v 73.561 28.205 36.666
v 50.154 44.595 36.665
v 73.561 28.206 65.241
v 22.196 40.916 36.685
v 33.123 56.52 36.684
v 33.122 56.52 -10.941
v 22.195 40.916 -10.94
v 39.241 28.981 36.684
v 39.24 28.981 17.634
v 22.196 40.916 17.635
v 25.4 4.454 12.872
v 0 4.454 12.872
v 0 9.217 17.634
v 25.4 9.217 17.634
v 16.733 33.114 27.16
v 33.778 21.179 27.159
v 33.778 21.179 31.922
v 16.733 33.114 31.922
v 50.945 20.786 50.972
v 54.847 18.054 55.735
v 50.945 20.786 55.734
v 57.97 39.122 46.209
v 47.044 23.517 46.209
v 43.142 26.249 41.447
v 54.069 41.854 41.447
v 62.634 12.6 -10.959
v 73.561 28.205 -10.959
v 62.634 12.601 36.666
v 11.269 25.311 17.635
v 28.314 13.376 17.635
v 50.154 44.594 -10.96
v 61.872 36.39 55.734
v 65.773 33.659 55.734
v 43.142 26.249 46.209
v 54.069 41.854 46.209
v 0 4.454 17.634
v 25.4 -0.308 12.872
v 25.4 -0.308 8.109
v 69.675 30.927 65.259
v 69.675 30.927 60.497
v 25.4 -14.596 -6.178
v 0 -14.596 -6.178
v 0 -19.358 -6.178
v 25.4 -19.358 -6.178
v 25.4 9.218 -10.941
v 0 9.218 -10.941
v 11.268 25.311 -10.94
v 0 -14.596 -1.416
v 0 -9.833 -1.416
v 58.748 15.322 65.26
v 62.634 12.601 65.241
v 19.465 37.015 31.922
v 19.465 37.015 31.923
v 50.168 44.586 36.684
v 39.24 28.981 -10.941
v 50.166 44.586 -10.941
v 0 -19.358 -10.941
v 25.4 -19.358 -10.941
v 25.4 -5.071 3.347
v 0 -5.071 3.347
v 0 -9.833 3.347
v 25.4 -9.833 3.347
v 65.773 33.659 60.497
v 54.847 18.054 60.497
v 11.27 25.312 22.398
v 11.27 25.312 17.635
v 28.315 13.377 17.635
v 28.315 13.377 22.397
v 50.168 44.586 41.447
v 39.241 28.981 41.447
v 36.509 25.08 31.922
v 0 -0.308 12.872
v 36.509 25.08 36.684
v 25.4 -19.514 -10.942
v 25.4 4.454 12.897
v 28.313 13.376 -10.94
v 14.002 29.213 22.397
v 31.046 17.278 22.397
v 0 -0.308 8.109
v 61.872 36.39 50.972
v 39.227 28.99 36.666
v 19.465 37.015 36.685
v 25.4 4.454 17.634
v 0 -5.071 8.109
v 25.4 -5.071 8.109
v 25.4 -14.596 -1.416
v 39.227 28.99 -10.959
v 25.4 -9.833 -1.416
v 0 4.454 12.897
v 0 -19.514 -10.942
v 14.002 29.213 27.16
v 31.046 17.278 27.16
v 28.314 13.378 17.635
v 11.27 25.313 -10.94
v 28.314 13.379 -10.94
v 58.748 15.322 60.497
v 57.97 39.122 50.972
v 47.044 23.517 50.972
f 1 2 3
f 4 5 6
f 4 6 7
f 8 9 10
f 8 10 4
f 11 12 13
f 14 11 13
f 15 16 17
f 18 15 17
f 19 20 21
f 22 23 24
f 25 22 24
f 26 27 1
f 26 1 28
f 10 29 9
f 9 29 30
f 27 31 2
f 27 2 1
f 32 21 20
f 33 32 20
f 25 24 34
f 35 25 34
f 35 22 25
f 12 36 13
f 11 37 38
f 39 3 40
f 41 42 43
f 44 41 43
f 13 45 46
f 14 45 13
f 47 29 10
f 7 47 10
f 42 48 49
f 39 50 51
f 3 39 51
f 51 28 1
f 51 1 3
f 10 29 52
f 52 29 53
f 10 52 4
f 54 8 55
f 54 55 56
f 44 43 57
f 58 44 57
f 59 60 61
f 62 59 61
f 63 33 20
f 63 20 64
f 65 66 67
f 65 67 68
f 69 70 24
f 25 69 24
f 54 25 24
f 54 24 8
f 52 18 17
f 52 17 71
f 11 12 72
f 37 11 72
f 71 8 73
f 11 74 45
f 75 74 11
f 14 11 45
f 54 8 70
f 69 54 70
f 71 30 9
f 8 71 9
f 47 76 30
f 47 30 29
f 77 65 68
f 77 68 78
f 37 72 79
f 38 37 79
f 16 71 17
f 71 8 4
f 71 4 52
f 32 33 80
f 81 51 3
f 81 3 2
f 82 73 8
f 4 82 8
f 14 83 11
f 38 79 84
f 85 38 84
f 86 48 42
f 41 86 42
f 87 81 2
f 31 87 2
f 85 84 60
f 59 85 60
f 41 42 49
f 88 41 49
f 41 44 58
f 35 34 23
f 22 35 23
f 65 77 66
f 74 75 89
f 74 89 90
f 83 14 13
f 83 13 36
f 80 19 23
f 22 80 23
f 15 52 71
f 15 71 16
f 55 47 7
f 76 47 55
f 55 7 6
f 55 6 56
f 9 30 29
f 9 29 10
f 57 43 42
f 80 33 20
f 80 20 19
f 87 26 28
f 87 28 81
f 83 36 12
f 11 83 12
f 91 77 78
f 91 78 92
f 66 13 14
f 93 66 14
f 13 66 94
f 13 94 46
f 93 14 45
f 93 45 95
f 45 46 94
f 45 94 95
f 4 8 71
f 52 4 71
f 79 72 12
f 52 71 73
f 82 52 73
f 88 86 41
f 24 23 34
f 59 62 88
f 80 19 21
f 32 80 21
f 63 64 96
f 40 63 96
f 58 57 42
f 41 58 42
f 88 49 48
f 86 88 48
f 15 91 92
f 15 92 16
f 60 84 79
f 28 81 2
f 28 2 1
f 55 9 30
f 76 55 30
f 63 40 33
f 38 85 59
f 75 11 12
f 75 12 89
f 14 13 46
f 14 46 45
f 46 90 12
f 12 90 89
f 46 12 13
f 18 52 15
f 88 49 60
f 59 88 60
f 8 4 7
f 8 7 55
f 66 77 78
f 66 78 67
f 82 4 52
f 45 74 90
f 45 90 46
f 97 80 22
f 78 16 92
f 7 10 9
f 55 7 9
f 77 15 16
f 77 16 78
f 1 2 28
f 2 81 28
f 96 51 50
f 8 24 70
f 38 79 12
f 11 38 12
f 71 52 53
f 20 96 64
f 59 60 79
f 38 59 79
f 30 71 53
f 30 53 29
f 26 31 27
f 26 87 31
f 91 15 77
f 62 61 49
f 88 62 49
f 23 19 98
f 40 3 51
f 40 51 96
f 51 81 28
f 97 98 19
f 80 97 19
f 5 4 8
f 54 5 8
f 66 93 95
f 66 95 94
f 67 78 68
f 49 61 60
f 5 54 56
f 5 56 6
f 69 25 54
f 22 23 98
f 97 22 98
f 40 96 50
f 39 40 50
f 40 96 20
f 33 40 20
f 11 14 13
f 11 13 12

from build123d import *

# Parameters (mm, degrees)
F1_DEPTH  = 25.4
F3_DEPTH  = 28.575
F5_DEPTH  = 20.80768
F7_DEPTH  = 47.625
F9_DEPTH  = 19.05
F11_DEPTH = 25.4
F13_DEPTH = 20.80768
F15_DEPTH = 19.05
F17_DEPTH = 47.625
F19_DEPTH = 28.575


with BuildPart() as f1:
    # F0 (on Right) → F1 (new body)
    with BuildSketch(Plane.YZ):
        Polygon((4.454064, 17.63429), (4.454064, 12.87179), (9.216739, 17.634465), align=None)
        Polygon((-0.308436, 12.87179), (-0.308436, 8.10929), (4.454064, 12.87179), align=None)
        Polygon((-5.070936, 8.10929), (-5.070936, 3.34679), (-0.308436, 8.10929), align=None)
        Polygon((-9.833436, 3.34679), (-9.833436, -1.41571), (-5.070936, 3.34679), align=None)
        Polygon((-14.595936, -1.41571), (-14.595936, -6.17821), (-9.833436, -1.41571), align=None)
        Polygon((-19.358436, -6.17821), (-19.358436, -10.94071), (-14.595936, -6.17821), align=None)
    extrude(amount=F1_DEPTH)


with BuildPart() as f3:
    # F2 (on face) → F3 (new body)
    with BuildSketch(Plane(origin=(0, -0.000648, 17.634126), x_dir=(1, 0, 0), z_dir=(0, -3.7e-05, 1))):
        Polygon((11.270112, 25.312776), (0, 9.217387), (25.4, 9.217387), (28.313768, 13.378679), align=None)
    extrude(amount=-F3_DEPTH)


with BuildPart() as f5:
    # F4 (on face) → F5 (new body)
    with BuildSketch(Plane(origin=(-4.330755, 3.032428, 0.000111), x_dir=(-0.573576, -0.819152, 1.5e-05), z_dir=(-0.819152, 0.573576, 2.1e-05))):
        Polygon((-36.722638, 27.160346), (-31.960565, 22.397846), (-31.960565, 27.160346), align=None)
        Polygon((-31.960565, 22.397846), (-27.198492, 17.635346), (-27.198492, 22.397846), align=None)
        Polygon((-41.48471, 31.922846), (-36.722638, 27.160346), (-36.722638, 31.922846), align=None)
        Polygon((-46.246783, 36.685346), (-41.48471, 31.922846), (-41.48471, 36.685346), align=None)
    extrude(amount=-F5_DEPTH)


with BuildPart() as f7:
    # F6 (on face) → F7 (new body)
    with BuildSketch(Plane(origin=(0.000944, 0, 36.685346), x_dir=(1, 0, -2.6e-05), z_dir=(2.6e-05, 0, 1))):
        Polygon((33.121941, 56.520421), (22.19531, 40.915575), (39.239963, 28.98078), (50.166595, 44.585626), align=None)
    extrude(amount=-F7_DEPTH)


with BuildPart() as f9:
    # F8 (on face) → F9 (new body)
    with BuildSketch(Plane(origin=(37.452696, 53.487994, -0.000963), x_dir=(-0.819152, 0.573576, -1e-05), z_dir=(0.573576, 0.819152, -1.5e-05))):
        Polygon((-44.080067, 65.241176), (-39.335952, 60.497359), (-39.335952, 65.259859), align=None)
        Polygon((-39.335952, 60.497359), (-34.573153, 55.734859), (-34.573153, 60.497359), align=None)
        Polygon((-34.573153, 55.734859), (-29.810353, 50.972359), (-29.810353, 55.734859), align=None)
        Polygon((-29.810353, 50.972359), (-25.047554, 46.209859), (-25.047554, 50.972359), align=None)
        Polygon((-25.047554, 46.209859), (-20.284755, 41.447359), (-20.284755, 46.209859), align=None)
        Polygon((-20.284755, 41.447359), (-15.521956, 36.684859), (-15.522106, 41.447359), align=None)
    extrude(amount=-F9_DEPTH)


with BuildPart() as f11:
    # F10 (on face) → F11 (new body)
    with BuildSketch(Plane.YZ.offset(25.4)):
        Polygon((9.217789, -10.940535), (9.216739, 17.634465), (4.454064, 12.87179), (4.454064, 12.89745), (-19.514113, -10.941591), align=None)
    extrude(amount=-F11_DEPTH)


with BuildPart() as f13:
    # F12 (on face) → F13 (new body)
    with BuildSketch(Plane(origin=(12.713898, -8.902367, -0.000327), x_dir=(0.573576, 0.819152, -1.5e-05), z_dir=(0.819152, -0.573576, -2.1e-05))):
        Polygon((46.246783, 17.635346), (46.246783, 36.685346), (41.48471, 31.922846), (41.48471, 31.923273), (27.196783, 17.635346), align=None)
    extrude(amount=-F13_DEPTH)


with BuildPart() as f15:
    # F14 (on face) → F15 (new body)
    with BuildSketch(Plane(origin=(26.526065, 37.883147, -0.000682), x_dir=(0.819152, -0.573576, 1e-05), z_dir=(-0.573576, -0.819152, 1.5e-05))):
        Polygon((44.080067, 36.666176), (44.080067, 65.241176), (15.505067, 36.666176), align=None)
    extrude(amount=-F15_DEPTH)


with BuildPart() as f17:
    # F16 (on face) → F17 (new body)
    with BuildSketch(Plane(origin=(0, 0.00066, 36.666176), x_dir=(1, 0, 0), z_dir=(0, -1.8e-05, -1))):
        Polygon((50.153704, -44.594652), (73.560974, -28.204706), (62.634342, -12.599859), (39.227073, -28.989806), align=None)
    extrude(amount=F17_DEPTH)


with BuildPart() as f19:
    # F18 (on face) → F19 (new body)
    with BuildSketch(Plane(origin=(0.000454, 0, 17.635346), x_dir=(1, 0, -2.6e-05), z_dir=(-2.6e-05, 0, -1))):
        Polygon((11.268679, -25.310728), (22.19531, -40.915575), (39.239963, -28.98078), (28.313332, -13.375933), align=None)
    extrude(amount=F19_DEPTH)


solid = Compound([f1.part, f3.part, f5.part, f7.part, f9.part, f11.part, f13.part, f15.part, f17.part, f19.part])
